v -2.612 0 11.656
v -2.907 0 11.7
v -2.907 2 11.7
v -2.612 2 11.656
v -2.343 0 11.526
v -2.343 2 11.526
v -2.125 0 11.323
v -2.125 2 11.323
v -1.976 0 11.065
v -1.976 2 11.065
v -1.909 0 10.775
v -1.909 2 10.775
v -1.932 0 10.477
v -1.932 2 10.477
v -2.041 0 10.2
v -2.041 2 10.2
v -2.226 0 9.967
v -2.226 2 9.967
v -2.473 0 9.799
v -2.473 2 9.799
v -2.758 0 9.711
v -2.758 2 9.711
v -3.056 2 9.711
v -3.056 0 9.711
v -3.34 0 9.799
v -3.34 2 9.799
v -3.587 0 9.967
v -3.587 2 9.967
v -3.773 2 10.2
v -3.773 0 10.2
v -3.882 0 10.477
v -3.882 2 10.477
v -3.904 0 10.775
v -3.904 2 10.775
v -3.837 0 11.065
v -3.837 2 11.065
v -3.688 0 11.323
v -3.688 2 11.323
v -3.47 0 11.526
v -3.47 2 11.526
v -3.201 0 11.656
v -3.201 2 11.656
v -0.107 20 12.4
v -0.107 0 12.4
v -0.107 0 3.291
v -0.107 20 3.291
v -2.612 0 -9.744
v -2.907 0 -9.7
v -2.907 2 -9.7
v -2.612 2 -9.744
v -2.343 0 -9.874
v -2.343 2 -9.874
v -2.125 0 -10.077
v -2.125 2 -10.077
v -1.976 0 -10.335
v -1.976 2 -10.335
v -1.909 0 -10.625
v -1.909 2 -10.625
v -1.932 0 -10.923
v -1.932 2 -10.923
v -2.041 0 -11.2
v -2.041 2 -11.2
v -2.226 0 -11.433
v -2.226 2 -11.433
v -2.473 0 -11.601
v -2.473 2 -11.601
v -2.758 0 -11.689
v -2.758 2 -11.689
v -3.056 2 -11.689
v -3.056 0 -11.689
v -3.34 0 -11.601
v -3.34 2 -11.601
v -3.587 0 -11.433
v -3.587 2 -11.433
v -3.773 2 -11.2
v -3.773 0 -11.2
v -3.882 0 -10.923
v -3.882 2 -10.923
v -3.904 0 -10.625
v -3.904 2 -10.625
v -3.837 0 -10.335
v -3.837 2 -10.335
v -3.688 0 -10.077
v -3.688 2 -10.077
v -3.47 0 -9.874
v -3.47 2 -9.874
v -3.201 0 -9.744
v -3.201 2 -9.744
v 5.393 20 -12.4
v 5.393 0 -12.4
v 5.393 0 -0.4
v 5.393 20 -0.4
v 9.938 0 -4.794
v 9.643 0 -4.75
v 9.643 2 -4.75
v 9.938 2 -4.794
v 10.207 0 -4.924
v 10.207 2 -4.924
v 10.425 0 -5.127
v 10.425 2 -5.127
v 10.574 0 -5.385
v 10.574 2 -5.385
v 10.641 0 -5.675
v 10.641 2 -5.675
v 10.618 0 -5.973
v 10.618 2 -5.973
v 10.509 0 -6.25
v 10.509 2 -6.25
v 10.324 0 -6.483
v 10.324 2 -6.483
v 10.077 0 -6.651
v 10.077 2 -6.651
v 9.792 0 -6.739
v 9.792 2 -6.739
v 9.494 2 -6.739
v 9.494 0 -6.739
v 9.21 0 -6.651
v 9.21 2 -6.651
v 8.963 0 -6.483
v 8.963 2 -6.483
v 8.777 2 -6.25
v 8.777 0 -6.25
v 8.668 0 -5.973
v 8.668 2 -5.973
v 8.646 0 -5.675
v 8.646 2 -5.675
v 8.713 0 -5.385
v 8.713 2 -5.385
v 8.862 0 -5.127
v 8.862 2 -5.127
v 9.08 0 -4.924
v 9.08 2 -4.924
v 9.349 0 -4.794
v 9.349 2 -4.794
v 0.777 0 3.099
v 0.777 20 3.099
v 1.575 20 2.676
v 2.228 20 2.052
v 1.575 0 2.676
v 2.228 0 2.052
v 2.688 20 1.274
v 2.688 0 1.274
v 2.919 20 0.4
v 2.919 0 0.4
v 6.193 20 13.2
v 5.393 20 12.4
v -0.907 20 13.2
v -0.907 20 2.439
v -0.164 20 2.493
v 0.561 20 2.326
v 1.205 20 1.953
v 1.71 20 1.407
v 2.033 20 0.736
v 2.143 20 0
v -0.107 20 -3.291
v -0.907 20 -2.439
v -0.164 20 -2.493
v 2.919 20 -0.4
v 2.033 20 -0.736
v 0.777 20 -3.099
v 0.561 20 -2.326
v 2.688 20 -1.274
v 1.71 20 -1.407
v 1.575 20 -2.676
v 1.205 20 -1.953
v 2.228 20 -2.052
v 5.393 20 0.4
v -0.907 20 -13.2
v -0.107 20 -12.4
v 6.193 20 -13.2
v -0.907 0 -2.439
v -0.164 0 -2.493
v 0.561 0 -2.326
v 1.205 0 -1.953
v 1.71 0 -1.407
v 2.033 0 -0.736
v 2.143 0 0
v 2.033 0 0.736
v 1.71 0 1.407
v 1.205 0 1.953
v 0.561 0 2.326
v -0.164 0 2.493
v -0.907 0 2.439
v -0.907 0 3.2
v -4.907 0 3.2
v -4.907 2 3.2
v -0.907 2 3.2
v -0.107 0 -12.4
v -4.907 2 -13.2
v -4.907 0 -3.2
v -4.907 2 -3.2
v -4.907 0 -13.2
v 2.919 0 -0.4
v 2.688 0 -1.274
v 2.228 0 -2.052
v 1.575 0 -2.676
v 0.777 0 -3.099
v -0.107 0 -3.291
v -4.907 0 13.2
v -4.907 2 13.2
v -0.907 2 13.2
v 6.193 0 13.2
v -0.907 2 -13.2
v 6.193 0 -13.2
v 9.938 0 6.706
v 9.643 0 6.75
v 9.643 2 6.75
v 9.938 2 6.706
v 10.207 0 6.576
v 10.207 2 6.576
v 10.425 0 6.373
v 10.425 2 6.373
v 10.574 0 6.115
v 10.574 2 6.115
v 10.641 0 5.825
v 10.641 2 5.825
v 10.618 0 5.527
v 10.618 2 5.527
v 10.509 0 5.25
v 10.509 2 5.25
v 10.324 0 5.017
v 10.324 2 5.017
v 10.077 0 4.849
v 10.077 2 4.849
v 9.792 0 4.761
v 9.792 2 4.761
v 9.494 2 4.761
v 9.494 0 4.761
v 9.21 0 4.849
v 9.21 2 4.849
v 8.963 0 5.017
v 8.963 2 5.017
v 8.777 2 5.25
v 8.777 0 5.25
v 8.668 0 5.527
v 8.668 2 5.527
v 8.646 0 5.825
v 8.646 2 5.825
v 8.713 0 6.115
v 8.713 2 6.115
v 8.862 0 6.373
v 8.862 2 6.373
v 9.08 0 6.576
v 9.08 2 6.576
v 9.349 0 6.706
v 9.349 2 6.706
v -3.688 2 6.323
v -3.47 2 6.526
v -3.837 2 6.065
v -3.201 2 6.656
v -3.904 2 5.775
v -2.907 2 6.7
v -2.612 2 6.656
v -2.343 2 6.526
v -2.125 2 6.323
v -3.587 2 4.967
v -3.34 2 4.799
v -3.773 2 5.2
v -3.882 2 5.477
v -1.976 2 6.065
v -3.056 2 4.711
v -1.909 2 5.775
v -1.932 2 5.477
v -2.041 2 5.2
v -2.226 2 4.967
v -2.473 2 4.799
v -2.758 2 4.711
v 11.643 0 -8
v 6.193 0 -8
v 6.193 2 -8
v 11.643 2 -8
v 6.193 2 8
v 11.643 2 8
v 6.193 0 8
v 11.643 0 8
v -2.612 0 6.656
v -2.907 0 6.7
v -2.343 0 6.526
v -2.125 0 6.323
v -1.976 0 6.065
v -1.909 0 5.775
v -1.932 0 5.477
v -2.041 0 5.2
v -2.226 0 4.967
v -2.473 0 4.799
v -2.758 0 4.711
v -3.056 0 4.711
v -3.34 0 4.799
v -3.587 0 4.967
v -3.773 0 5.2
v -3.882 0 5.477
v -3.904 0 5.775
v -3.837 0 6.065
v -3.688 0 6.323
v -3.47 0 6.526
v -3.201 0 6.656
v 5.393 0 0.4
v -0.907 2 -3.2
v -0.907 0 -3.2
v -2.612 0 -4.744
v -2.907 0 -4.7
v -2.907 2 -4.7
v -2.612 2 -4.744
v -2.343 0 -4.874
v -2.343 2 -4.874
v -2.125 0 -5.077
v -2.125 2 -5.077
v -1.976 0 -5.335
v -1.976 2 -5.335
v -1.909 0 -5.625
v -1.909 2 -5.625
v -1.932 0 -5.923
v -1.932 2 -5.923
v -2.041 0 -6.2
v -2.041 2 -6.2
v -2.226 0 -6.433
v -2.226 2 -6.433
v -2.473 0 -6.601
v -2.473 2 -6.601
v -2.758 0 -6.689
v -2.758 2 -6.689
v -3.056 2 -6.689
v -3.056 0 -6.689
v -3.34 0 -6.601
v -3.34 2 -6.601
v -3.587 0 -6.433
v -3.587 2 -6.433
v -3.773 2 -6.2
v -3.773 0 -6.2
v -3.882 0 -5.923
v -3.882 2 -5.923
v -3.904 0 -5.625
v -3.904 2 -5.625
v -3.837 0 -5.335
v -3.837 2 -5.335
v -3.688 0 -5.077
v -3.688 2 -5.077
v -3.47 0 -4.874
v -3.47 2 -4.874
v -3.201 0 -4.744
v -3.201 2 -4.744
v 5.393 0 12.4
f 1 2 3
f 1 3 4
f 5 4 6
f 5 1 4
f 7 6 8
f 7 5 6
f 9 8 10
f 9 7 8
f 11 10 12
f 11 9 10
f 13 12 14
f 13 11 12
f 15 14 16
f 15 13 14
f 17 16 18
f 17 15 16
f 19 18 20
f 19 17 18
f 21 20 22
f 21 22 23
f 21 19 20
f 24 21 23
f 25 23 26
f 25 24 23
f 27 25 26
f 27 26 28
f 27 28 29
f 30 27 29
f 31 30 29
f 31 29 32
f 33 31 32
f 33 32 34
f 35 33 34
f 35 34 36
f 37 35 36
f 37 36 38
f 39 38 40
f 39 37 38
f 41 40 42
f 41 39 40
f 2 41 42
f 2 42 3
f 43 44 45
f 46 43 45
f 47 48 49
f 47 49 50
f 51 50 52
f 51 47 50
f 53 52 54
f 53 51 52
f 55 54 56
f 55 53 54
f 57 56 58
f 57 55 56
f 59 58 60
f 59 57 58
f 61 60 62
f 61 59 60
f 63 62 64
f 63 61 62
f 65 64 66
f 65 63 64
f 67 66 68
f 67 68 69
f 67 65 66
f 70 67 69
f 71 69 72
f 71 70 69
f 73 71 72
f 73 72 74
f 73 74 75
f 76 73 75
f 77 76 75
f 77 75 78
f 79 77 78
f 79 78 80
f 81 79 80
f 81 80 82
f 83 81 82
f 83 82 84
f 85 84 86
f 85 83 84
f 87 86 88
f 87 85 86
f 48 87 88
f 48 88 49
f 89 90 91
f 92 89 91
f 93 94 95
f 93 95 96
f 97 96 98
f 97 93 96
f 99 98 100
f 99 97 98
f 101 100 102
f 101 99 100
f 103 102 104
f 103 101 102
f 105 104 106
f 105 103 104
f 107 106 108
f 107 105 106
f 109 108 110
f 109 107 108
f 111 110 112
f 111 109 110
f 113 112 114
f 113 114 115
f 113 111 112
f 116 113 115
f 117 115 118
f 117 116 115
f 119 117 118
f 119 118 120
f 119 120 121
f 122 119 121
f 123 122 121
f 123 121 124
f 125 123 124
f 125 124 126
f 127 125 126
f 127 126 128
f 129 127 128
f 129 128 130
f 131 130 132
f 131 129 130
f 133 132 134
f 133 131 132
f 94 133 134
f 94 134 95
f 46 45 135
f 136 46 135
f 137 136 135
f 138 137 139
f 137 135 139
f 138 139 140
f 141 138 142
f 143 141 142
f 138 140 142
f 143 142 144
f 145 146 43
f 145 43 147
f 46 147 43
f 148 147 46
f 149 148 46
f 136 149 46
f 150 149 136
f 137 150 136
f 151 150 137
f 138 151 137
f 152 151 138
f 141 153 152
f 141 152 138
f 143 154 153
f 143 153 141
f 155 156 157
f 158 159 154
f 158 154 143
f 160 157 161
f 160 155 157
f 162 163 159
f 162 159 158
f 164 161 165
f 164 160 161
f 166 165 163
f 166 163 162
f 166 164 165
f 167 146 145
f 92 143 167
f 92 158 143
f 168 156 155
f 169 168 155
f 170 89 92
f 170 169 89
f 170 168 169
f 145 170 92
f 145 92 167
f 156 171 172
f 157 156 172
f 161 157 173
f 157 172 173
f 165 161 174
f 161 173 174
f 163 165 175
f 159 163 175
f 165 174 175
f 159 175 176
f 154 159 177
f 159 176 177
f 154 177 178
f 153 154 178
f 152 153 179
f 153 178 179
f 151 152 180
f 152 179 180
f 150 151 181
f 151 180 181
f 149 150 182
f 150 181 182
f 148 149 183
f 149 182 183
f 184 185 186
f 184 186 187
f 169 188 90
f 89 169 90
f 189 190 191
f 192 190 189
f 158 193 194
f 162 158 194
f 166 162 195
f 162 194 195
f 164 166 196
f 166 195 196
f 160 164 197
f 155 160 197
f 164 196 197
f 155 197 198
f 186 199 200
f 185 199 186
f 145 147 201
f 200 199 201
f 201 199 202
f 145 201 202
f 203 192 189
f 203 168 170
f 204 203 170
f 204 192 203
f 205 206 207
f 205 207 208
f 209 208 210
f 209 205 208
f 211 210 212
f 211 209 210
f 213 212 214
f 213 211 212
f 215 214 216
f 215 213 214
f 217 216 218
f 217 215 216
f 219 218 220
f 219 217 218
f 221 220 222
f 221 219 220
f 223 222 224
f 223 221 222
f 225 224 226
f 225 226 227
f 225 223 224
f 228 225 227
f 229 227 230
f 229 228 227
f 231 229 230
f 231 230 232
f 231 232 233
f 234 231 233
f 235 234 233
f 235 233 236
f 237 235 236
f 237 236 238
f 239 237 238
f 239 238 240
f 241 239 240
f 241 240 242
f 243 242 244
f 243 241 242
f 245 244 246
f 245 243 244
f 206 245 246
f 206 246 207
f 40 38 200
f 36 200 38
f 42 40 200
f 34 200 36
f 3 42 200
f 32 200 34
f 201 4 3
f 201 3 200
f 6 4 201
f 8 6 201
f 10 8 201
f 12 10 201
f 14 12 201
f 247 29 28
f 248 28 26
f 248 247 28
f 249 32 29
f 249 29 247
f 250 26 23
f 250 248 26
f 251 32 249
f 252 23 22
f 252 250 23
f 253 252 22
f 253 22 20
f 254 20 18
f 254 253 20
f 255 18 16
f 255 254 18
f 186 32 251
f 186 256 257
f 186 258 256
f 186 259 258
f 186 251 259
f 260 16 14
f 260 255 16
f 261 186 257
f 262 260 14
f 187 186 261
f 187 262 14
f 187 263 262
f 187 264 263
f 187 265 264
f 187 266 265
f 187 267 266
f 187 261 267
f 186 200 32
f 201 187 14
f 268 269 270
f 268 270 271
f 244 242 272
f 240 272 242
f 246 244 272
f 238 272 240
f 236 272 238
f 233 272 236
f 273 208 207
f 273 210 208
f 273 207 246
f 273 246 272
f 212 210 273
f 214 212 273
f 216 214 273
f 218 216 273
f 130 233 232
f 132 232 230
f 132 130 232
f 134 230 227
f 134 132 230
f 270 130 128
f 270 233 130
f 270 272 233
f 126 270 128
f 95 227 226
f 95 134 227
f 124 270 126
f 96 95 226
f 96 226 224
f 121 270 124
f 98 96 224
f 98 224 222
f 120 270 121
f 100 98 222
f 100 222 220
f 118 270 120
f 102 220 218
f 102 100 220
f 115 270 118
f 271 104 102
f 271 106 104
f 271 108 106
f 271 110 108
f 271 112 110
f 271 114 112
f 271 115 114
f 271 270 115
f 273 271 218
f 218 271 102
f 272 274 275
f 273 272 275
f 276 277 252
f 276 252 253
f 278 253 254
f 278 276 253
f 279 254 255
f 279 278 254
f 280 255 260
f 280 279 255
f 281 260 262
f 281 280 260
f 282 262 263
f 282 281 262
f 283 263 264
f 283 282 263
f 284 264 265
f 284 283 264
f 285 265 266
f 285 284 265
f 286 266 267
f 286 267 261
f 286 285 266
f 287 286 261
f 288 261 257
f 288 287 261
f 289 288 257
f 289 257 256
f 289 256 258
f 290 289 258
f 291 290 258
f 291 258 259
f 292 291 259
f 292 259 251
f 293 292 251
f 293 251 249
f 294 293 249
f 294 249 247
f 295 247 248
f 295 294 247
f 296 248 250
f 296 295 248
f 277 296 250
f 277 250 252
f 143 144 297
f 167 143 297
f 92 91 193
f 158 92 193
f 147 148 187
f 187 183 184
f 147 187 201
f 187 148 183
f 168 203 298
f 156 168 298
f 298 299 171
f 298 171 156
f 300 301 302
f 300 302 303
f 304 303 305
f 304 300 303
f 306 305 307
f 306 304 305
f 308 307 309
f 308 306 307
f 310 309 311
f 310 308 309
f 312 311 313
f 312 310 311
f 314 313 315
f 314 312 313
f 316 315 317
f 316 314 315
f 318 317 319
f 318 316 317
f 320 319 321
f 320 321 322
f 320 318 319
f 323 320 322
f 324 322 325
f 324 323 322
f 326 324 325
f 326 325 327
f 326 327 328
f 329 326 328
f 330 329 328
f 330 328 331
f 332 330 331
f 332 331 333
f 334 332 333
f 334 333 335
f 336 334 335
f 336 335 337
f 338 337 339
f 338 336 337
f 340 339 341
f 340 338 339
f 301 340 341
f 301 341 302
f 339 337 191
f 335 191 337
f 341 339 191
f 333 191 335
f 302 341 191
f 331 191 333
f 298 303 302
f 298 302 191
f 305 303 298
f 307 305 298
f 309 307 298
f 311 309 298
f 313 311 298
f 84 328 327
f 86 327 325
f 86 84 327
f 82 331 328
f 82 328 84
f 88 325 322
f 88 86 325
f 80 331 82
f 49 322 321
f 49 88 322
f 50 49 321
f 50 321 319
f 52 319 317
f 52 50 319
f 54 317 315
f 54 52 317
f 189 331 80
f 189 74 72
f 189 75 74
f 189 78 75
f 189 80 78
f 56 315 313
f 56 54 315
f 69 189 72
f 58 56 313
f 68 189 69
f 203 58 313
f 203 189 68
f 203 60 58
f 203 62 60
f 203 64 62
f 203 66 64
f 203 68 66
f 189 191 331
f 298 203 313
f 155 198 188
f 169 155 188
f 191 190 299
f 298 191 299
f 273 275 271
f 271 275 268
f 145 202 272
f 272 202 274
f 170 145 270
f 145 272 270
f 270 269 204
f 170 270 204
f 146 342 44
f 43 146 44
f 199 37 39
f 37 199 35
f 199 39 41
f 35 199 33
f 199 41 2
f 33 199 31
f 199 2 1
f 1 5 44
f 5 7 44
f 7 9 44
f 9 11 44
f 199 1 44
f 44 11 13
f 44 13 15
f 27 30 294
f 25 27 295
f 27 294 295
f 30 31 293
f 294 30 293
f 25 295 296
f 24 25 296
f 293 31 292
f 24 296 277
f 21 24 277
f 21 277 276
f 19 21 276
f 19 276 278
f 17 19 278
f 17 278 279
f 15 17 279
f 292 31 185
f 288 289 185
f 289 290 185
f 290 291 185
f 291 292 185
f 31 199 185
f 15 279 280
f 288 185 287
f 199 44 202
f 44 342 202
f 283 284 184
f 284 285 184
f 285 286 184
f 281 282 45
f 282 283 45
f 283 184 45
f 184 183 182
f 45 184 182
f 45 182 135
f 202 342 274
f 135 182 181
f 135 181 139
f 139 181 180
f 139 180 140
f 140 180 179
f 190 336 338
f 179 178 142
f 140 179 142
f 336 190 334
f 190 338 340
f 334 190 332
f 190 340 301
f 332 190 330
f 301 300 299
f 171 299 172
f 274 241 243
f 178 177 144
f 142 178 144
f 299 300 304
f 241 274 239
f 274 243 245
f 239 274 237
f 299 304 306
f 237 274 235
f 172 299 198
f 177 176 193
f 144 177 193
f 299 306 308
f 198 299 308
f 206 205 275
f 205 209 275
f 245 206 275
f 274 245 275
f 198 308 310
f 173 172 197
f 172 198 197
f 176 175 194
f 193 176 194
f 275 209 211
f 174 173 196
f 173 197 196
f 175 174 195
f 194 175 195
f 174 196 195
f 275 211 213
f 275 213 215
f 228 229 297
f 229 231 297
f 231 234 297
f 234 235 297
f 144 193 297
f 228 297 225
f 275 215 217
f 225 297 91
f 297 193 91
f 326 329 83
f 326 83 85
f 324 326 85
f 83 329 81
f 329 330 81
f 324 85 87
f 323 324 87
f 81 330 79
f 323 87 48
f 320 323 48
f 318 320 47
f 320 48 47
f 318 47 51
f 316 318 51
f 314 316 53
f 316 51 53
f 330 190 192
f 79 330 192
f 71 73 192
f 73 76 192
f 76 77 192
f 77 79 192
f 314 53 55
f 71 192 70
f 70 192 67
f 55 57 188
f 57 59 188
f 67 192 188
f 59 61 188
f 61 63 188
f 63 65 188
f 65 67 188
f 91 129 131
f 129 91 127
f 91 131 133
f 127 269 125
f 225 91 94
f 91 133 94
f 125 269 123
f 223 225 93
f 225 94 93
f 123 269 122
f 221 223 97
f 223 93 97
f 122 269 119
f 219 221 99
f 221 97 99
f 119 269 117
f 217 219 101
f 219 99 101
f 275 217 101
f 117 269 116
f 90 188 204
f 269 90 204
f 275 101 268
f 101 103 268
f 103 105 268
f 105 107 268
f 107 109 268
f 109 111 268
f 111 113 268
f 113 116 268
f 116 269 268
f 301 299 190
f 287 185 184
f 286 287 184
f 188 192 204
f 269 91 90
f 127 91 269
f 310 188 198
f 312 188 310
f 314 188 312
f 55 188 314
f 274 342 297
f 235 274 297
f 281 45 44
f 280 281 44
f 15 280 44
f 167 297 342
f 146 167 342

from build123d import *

# Parameters (mm, degrees)
BOSS_EXTRUDE1_DEPTH = 20
SKETCH1_3_W         = 4
SKETCH1_3_H         = 10
SKETCH1_3_R         = 1
SKETCH1_3_W_2       = 5.45
SKETCH1_3_H_2       = 16
BOSS_EXTRUDE2_DEPTH = 2


with BuildPart() as part:
    # Sketch1 → Boss-Extrude1 (new body)
    with BuildSketch(Plane(origin=(0, 0, 0), x_dir=(1, 0, 0), z_dir=(0, 1, 0))):
        with BuildLine():
            ThreePointArc((-0.906603032, 2.43874968), (2.143396968, 0), (-0.906603032, -2.43874968))
            Line((-0.906603032, -2.43874968), (-0.906603032, -13.2))
            Line((-0.906603032, -13.2), (6.193396968, -13.2))
            Line((6.193396968, -13.2), (6.193396968, 13.2))
            Line((6.193396968, 13.2), (-0.906603032, 13.2))
            Line((-0.906603032, 13.2), (-0.906603032, 2.43874968))
        make_face()
        with BuildLine():
            Line((5.393396968, 12.4), (5.393396968, 0.4))
            Line((5.393396968, 0.4), (2.919064839, 0.4))
            ThreePointArc((2.919064839, 0.4), (1.922948491, 2.386135967), (-0.106603032, 3.290516677))
            Line((-0.106603032, 3.290516677), (-0.106603032, 12.4))
            Line((-0.106603032, 12.4), (5.393396968, 12.4))
        make_face(mode=Mode.SUBTRACT)
        with BuildLine():
            Line((-0.106603032, -12.4), (-0.106603032, -3.290516677))
            ThreePointArc((-0.106603032, -3.290516677), (1.922948491, -2.386135967), (2.919064839, -0.4))
            Line((2.919064839, -0.4), (5.393396968, -0.4))
            Line((5.393396968, -0.4), (5.393396968, -12.4))
            Line((5.393396968, -12.4), (-0.106603032, -12.4))
        make_face(mode=Mode.SUBTRACT)
    extrude(amount=BOSS_EXTRUDE1_DEPTH)

    # Sketch1<3> → Boss-Extrude2 (add)
    # profile 1 of 3: a face of its own
    with BuildSketch(Plane(origin=(0, 0, 0), x_dir=(1, 0, 0), z_dir=(0, 1, 0))):
        with Locations((-2.906603032, 8.2)):
            Rectangle(SKETCH1_3_W, SKETCH1_3_H)
        with Locations((-2.906603032, 5.7)):
            Circle(SKETCH1_3_R, mode=Mode.SUBTRACT)
        with Locations((-2.906603032, 10.7)):
            Circle(SKETCH1_3_R, mode=Mode.SUBTRACT)
    # profile 2 of 3: a face of its own
    with BuildSketch(Plane(origin=(0, 0, 0), x_dir=(1, 0, 0), z_dir=(0, 1, 0))):
        with Locations((-2.906603032, -8.2)):
            Rectangle(SKETCH1_3_W, SKETCH1_3_H)
        with Locations((-2.906603032, -10.7)):
            Circle(SKETCH1_3_R, mode=Mode.SUBTRACT)
        with Locations((-2.906603032, -5.7)):
            Circle(SKETCH1_3_R, mode=Mode.SUBTRACT)
    # profile 3 of 3: a face of its own
    with BuildSketch(Plane(origin=(0, 0, 0), x_dir=(1, 0, 0), z_dir=(0, 1, 0))):
        with Locations((8.918396968, 0)):
            Rectangle(SKETCH1_3_W_2, SKETCH1_3_H_2)
        with Locations((9.643396968, -5.75)):
            Circle(SKETCH1_3_R, mode=Mode.SUBTRACT)
        with Locations((9.643396968, 5.75)):
            Circle(SKETCH1_3_R, mode=Mode.SUBTRACT)
    extrude(amount=BOSS_EXTRUDE2_DEPTH)


solid = part.part
